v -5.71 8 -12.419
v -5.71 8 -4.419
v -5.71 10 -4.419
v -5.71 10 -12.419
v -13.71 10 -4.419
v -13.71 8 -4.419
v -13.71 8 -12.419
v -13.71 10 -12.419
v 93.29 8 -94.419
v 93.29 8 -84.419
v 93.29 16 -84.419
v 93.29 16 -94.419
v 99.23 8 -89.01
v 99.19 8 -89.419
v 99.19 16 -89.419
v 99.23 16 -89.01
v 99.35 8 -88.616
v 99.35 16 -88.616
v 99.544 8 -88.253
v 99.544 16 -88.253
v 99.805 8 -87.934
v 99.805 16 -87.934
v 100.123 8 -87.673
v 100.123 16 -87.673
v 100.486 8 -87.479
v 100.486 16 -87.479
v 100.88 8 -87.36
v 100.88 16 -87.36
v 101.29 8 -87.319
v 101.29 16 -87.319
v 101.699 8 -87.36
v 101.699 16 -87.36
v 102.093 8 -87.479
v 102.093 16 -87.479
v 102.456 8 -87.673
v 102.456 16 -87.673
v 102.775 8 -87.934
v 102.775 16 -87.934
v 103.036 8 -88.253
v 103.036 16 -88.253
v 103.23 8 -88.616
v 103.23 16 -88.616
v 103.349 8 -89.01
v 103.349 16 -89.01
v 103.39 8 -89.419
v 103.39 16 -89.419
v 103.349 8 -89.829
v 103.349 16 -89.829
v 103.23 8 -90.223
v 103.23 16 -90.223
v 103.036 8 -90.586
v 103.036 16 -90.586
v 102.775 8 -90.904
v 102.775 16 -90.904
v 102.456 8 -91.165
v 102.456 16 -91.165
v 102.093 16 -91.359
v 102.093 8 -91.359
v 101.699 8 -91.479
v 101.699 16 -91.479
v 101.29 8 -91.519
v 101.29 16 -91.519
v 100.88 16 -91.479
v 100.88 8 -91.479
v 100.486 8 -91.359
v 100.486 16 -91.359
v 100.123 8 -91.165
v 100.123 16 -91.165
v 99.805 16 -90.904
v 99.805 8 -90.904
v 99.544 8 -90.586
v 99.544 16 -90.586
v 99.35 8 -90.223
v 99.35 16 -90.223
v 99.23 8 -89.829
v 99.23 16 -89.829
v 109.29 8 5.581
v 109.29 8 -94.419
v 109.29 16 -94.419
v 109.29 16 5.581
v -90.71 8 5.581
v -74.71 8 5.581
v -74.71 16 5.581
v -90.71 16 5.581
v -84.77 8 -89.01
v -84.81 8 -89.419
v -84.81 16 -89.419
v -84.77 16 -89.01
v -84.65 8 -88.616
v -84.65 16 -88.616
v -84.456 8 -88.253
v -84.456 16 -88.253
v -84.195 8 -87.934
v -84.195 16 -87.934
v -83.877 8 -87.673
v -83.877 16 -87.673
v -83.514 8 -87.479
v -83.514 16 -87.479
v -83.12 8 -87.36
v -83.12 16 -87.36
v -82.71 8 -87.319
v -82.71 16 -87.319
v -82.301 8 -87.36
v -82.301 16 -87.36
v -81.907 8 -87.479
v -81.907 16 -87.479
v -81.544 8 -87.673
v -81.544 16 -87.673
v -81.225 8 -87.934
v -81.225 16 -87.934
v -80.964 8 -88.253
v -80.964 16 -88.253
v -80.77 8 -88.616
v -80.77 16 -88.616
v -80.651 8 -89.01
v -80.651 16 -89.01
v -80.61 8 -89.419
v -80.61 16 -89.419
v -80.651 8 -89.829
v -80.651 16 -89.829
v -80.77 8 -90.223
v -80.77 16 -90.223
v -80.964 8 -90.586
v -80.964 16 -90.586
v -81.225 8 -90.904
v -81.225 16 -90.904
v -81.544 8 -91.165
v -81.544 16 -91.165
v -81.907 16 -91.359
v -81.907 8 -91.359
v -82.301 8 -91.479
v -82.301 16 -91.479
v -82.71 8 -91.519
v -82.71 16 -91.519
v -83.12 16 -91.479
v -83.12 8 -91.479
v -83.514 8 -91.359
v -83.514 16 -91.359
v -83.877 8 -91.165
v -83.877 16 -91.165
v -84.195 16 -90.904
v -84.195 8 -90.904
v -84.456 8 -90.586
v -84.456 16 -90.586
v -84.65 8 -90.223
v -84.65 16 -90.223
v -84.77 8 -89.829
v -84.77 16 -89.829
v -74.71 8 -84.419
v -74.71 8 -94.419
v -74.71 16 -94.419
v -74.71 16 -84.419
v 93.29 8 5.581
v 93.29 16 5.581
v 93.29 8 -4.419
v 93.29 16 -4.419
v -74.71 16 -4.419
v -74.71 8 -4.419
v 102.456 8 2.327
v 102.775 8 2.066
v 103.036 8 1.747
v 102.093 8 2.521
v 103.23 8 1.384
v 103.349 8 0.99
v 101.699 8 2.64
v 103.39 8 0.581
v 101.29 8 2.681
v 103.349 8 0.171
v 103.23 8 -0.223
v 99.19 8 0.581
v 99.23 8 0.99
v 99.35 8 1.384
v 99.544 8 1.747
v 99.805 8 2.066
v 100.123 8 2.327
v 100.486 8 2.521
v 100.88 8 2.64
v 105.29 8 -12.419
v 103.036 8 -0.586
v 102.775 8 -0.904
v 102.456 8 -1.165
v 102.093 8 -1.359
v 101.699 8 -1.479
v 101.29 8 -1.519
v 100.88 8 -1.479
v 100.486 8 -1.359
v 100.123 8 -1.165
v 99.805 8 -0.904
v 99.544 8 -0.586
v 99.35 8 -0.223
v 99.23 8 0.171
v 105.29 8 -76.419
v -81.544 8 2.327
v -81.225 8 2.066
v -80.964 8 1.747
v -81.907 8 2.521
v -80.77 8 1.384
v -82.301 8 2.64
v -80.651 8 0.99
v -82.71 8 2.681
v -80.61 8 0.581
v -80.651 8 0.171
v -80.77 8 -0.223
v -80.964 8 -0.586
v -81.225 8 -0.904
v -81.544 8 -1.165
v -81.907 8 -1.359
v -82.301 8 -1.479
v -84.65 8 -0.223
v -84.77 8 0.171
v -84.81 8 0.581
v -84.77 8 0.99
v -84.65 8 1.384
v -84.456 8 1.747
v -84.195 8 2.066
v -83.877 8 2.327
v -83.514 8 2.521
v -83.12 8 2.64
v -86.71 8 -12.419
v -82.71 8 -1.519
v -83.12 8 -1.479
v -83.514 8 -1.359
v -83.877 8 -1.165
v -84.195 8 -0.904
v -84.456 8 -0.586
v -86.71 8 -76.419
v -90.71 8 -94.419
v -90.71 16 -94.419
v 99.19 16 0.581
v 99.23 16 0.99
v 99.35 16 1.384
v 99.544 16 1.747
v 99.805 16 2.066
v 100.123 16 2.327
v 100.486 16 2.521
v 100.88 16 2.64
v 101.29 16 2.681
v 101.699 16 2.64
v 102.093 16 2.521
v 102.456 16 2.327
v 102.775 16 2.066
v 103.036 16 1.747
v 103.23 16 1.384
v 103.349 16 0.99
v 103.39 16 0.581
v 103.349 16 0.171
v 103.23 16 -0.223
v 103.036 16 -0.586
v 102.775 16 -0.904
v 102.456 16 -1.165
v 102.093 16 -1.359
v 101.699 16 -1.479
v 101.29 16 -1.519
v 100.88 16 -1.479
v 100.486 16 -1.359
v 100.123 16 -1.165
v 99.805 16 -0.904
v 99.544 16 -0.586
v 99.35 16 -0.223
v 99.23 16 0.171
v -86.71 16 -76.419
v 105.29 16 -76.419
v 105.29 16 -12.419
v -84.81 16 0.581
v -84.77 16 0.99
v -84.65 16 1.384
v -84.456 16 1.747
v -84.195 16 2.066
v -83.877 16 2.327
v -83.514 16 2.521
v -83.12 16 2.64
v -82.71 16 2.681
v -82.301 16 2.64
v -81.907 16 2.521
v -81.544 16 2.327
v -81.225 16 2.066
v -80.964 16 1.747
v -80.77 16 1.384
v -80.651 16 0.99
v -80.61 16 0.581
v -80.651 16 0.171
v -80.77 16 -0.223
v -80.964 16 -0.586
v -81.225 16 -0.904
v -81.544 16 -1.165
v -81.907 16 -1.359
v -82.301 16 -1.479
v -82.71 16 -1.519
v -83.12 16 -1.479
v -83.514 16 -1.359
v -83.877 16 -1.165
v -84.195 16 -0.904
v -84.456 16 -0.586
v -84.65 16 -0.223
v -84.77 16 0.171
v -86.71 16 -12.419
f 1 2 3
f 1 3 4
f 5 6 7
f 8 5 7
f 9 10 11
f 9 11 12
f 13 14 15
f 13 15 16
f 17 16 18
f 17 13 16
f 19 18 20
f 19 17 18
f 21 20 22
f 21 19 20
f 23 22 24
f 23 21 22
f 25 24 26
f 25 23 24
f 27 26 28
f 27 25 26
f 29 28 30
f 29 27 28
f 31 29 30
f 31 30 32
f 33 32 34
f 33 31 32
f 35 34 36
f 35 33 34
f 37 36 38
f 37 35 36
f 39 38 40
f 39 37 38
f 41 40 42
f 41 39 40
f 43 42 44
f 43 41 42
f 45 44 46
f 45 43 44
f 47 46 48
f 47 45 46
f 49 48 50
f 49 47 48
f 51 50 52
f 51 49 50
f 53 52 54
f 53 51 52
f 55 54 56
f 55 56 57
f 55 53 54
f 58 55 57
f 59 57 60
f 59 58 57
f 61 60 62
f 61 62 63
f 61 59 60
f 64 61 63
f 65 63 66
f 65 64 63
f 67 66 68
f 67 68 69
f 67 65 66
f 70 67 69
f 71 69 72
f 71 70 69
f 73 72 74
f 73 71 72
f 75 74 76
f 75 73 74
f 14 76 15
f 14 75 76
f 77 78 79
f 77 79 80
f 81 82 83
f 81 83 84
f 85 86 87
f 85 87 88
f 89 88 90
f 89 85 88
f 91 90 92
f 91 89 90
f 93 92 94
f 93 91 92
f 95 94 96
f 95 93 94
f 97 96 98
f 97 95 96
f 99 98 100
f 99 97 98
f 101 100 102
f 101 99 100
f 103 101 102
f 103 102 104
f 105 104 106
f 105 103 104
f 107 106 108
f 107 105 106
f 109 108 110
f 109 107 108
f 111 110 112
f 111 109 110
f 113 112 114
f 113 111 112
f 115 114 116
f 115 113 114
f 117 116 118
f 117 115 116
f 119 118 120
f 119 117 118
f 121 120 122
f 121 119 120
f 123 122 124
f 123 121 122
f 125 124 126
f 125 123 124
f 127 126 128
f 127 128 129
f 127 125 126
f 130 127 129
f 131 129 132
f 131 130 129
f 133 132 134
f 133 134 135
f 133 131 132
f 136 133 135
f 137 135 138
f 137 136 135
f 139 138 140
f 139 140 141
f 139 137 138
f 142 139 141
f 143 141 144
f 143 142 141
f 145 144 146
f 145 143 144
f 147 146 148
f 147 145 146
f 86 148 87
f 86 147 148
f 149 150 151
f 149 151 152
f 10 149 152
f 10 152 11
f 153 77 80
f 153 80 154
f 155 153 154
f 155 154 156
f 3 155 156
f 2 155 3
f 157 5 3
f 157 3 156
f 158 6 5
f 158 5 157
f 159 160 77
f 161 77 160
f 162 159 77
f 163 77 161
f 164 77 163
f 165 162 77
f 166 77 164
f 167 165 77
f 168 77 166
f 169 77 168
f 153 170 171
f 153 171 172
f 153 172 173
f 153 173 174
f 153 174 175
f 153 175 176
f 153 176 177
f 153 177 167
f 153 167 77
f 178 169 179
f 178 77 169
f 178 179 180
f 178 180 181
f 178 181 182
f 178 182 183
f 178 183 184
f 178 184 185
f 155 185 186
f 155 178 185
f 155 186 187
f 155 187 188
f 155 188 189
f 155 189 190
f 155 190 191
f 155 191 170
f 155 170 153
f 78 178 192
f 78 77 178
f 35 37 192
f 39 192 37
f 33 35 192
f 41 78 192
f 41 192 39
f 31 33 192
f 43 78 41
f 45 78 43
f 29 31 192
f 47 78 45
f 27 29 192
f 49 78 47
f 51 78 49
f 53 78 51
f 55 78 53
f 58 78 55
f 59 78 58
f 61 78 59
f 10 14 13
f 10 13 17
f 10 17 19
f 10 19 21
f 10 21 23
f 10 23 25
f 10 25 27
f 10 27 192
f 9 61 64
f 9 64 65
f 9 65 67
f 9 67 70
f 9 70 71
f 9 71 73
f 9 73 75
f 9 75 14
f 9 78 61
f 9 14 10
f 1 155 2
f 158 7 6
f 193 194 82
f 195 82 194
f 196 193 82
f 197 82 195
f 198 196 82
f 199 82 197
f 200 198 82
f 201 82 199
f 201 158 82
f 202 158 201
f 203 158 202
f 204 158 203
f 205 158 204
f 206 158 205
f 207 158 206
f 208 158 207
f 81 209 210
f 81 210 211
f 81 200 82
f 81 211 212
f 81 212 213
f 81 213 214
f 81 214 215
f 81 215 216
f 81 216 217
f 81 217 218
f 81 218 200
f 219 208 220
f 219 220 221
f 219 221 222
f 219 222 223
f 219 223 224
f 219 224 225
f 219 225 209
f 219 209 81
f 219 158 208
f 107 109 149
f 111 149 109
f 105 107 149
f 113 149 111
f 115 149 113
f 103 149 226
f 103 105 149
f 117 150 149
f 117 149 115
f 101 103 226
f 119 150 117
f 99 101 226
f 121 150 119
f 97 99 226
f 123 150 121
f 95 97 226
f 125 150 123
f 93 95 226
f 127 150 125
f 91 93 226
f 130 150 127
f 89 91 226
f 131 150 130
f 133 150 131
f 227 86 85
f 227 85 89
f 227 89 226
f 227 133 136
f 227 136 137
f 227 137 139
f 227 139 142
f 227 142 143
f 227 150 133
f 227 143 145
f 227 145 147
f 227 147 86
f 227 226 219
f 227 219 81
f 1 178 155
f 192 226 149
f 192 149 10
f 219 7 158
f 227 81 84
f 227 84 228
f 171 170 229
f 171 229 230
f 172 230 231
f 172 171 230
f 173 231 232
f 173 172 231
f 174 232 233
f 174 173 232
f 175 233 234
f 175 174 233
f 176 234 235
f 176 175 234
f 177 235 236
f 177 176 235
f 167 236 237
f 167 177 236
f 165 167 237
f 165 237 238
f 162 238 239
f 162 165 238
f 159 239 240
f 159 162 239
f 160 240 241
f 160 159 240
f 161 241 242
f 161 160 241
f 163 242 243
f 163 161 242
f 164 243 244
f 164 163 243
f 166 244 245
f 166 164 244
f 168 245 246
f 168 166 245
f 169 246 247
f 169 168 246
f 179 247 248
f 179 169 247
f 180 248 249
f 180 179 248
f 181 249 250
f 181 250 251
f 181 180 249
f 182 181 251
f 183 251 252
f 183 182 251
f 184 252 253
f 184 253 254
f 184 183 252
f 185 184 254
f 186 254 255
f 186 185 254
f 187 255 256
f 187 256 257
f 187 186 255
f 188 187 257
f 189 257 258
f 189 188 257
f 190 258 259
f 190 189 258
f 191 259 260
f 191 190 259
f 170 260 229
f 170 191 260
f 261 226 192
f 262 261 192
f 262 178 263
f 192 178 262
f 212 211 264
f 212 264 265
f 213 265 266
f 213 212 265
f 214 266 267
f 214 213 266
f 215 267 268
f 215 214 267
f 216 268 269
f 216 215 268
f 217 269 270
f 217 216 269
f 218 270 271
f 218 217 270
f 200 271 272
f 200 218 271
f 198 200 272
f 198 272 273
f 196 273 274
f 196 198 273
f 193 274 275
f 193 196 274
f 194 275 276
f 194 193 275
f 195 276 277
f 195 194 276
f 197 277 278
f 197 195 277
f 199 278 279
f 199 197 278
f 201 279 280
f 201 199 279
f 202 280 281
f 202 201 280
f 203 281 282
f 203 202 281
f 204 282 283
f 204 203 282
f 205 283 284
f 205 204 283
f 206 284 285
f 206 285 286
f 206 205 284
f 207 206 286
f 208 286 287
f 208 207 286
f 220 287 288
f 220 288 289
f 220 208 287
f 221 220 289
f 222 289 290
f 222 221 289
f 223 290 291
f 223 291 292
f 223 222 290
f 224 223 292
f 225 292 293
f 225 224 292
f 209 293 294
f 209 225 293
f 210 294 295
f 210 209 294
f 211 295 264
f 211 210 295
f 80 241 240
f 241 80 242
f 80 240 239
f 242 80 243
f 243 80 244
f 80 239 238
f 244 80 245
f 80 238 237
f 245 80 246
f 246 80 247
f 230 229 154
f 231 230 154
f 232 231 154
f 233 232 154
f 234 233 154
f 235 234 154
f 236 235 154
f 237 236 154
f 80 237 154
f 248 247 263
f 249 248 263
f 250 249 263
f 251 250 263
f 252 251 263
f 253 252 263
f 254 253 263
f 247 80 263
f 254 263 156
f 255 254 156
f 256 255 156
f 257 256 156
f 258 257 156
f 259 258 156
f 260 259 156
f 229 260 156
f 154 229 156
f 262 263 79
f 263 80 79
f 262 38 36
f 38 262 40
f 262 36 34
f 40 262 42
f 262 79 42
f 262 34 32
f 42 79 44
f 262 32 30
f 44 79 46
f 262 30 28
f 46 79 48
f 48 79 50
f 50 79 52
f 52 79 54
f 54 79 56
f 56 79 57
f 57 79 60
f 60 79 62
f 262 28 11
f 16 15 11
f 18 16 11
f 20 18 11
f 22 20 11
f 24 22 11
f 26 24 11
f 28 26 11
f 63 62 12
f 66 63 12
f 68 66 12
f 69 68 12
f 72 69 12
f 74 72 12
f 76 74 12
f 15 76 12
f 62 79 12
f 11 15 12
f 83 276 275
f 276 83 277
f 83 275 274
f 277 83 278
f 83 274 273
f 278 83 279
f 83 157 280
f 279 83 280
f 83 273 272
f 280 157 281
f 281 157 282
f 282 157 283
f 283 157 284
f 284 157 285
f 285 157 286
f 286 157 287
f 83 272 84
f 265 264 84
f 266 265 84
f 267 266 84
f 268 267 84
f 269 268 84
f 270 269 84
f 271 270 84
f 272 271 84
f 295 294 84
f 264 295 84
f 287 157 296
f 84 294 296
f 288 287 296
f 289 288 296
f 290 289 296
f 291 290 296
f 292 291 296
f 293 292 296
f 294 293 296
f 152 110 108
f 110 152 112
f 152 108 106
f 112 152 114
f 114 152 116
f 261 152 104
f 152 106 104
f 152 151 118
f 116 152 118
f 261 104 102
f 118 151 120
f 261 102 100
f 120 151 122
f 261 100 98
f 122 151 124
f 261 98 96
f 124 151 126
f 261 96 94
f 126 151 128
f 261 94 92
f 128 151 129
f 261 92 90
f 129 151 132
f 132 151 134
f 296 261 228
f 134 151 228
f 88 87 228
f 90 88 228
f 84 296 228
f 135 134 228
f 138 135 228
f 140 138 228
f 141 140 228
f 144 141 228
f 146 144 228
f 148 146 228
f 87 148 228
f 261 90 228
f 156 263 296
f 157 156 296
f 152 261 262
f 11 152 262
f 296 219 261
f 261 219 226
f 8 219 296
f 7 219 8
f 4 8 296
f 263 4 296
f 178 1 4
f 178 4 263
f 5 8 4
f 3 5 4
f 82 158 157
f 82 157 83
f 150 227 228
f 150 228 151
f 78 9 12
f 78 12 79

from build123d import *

# Parameters (mm, degrees)
SKETCH_1_R          = 2.1
SKETCH_1_W          = 192
SKETCH_1_H          = 64
EXTRUDE_1_DEPTH     = 8
SKETCH_3_W          = 8
SKETCH_3_H          = 8
CUT_EXTRUDE_1_DEPTH = 2


with BuildPart() as part:
    # Эскиз1 → Бобышка-Вытянуть1 (new body)
    with BuildSketch(Plane(origin=(0, 8, 0), x_dir=(1, 0, 0), z_dir=(0, 1, 0))):
        Polygon((109.289774647, 94.419345598), (109.289774647, -5.580654402), (93.289774647, -5.580654402), (93.289774647, 4.419345598), (-74.710225353, 4.419345598), (-74.710225353, -5.580654402), (-90.710225353, -5.580654402), (-90.710225353, 94.419345598), (-74.710225353, 94.419345598), (-74.710225353, 84.419345598), (93.289774647, 84.419345598), (93.289774647, 94.419345598), align=None)
        with Locations(Location((-82.710225353, 89.419345598, 0), (0, 0, 180))):
            Circle(SKETCH_1_R, mode=Mode.SUBTRACT)
        with Locations(Location((-82.710225353, -0.580654402, 0), (0, 0, 180))):
            Circle(SKETCH_1_R, mode=Mode.SUBTRACT)
        with Locations(Location((101.289774647, -0.580654402, 0), (0, 0, 180))):
            Circle(SKETCH_1_R, mode=Mode.SUBTRACT)
        with Locations(Location((101.289774647, 89.419345598, 0), (0, 0, 180))):
            Circle(SKETCH_1_R, mode=Mode.SUBTRACT)
        with Locations((9.289774647, 44.419345598)):
            Rectangle(SKETCH_1_W, SKETCH_1_H, mode=Mode.SUBTRACT)
    extrude(amount=EXTRUDE_1_DEPTH)

    # Эскиз3 → Вырез-Вытянуть1 (cut)
    with BuildSketch(Plane(origin=(0, 8, 0), x_dir=(1, 0, 0), z_dir=(0, 1, 0))):
        with Locations((-9.710225353, 8.419345598)):
            Rectangle(SKETCH_3_W, SKETCH_3_H)
    extrude(amount=CUT_EXTRUDE_1_DEPTH, mode=Mode.SUBTRACT)


solid = part.part
